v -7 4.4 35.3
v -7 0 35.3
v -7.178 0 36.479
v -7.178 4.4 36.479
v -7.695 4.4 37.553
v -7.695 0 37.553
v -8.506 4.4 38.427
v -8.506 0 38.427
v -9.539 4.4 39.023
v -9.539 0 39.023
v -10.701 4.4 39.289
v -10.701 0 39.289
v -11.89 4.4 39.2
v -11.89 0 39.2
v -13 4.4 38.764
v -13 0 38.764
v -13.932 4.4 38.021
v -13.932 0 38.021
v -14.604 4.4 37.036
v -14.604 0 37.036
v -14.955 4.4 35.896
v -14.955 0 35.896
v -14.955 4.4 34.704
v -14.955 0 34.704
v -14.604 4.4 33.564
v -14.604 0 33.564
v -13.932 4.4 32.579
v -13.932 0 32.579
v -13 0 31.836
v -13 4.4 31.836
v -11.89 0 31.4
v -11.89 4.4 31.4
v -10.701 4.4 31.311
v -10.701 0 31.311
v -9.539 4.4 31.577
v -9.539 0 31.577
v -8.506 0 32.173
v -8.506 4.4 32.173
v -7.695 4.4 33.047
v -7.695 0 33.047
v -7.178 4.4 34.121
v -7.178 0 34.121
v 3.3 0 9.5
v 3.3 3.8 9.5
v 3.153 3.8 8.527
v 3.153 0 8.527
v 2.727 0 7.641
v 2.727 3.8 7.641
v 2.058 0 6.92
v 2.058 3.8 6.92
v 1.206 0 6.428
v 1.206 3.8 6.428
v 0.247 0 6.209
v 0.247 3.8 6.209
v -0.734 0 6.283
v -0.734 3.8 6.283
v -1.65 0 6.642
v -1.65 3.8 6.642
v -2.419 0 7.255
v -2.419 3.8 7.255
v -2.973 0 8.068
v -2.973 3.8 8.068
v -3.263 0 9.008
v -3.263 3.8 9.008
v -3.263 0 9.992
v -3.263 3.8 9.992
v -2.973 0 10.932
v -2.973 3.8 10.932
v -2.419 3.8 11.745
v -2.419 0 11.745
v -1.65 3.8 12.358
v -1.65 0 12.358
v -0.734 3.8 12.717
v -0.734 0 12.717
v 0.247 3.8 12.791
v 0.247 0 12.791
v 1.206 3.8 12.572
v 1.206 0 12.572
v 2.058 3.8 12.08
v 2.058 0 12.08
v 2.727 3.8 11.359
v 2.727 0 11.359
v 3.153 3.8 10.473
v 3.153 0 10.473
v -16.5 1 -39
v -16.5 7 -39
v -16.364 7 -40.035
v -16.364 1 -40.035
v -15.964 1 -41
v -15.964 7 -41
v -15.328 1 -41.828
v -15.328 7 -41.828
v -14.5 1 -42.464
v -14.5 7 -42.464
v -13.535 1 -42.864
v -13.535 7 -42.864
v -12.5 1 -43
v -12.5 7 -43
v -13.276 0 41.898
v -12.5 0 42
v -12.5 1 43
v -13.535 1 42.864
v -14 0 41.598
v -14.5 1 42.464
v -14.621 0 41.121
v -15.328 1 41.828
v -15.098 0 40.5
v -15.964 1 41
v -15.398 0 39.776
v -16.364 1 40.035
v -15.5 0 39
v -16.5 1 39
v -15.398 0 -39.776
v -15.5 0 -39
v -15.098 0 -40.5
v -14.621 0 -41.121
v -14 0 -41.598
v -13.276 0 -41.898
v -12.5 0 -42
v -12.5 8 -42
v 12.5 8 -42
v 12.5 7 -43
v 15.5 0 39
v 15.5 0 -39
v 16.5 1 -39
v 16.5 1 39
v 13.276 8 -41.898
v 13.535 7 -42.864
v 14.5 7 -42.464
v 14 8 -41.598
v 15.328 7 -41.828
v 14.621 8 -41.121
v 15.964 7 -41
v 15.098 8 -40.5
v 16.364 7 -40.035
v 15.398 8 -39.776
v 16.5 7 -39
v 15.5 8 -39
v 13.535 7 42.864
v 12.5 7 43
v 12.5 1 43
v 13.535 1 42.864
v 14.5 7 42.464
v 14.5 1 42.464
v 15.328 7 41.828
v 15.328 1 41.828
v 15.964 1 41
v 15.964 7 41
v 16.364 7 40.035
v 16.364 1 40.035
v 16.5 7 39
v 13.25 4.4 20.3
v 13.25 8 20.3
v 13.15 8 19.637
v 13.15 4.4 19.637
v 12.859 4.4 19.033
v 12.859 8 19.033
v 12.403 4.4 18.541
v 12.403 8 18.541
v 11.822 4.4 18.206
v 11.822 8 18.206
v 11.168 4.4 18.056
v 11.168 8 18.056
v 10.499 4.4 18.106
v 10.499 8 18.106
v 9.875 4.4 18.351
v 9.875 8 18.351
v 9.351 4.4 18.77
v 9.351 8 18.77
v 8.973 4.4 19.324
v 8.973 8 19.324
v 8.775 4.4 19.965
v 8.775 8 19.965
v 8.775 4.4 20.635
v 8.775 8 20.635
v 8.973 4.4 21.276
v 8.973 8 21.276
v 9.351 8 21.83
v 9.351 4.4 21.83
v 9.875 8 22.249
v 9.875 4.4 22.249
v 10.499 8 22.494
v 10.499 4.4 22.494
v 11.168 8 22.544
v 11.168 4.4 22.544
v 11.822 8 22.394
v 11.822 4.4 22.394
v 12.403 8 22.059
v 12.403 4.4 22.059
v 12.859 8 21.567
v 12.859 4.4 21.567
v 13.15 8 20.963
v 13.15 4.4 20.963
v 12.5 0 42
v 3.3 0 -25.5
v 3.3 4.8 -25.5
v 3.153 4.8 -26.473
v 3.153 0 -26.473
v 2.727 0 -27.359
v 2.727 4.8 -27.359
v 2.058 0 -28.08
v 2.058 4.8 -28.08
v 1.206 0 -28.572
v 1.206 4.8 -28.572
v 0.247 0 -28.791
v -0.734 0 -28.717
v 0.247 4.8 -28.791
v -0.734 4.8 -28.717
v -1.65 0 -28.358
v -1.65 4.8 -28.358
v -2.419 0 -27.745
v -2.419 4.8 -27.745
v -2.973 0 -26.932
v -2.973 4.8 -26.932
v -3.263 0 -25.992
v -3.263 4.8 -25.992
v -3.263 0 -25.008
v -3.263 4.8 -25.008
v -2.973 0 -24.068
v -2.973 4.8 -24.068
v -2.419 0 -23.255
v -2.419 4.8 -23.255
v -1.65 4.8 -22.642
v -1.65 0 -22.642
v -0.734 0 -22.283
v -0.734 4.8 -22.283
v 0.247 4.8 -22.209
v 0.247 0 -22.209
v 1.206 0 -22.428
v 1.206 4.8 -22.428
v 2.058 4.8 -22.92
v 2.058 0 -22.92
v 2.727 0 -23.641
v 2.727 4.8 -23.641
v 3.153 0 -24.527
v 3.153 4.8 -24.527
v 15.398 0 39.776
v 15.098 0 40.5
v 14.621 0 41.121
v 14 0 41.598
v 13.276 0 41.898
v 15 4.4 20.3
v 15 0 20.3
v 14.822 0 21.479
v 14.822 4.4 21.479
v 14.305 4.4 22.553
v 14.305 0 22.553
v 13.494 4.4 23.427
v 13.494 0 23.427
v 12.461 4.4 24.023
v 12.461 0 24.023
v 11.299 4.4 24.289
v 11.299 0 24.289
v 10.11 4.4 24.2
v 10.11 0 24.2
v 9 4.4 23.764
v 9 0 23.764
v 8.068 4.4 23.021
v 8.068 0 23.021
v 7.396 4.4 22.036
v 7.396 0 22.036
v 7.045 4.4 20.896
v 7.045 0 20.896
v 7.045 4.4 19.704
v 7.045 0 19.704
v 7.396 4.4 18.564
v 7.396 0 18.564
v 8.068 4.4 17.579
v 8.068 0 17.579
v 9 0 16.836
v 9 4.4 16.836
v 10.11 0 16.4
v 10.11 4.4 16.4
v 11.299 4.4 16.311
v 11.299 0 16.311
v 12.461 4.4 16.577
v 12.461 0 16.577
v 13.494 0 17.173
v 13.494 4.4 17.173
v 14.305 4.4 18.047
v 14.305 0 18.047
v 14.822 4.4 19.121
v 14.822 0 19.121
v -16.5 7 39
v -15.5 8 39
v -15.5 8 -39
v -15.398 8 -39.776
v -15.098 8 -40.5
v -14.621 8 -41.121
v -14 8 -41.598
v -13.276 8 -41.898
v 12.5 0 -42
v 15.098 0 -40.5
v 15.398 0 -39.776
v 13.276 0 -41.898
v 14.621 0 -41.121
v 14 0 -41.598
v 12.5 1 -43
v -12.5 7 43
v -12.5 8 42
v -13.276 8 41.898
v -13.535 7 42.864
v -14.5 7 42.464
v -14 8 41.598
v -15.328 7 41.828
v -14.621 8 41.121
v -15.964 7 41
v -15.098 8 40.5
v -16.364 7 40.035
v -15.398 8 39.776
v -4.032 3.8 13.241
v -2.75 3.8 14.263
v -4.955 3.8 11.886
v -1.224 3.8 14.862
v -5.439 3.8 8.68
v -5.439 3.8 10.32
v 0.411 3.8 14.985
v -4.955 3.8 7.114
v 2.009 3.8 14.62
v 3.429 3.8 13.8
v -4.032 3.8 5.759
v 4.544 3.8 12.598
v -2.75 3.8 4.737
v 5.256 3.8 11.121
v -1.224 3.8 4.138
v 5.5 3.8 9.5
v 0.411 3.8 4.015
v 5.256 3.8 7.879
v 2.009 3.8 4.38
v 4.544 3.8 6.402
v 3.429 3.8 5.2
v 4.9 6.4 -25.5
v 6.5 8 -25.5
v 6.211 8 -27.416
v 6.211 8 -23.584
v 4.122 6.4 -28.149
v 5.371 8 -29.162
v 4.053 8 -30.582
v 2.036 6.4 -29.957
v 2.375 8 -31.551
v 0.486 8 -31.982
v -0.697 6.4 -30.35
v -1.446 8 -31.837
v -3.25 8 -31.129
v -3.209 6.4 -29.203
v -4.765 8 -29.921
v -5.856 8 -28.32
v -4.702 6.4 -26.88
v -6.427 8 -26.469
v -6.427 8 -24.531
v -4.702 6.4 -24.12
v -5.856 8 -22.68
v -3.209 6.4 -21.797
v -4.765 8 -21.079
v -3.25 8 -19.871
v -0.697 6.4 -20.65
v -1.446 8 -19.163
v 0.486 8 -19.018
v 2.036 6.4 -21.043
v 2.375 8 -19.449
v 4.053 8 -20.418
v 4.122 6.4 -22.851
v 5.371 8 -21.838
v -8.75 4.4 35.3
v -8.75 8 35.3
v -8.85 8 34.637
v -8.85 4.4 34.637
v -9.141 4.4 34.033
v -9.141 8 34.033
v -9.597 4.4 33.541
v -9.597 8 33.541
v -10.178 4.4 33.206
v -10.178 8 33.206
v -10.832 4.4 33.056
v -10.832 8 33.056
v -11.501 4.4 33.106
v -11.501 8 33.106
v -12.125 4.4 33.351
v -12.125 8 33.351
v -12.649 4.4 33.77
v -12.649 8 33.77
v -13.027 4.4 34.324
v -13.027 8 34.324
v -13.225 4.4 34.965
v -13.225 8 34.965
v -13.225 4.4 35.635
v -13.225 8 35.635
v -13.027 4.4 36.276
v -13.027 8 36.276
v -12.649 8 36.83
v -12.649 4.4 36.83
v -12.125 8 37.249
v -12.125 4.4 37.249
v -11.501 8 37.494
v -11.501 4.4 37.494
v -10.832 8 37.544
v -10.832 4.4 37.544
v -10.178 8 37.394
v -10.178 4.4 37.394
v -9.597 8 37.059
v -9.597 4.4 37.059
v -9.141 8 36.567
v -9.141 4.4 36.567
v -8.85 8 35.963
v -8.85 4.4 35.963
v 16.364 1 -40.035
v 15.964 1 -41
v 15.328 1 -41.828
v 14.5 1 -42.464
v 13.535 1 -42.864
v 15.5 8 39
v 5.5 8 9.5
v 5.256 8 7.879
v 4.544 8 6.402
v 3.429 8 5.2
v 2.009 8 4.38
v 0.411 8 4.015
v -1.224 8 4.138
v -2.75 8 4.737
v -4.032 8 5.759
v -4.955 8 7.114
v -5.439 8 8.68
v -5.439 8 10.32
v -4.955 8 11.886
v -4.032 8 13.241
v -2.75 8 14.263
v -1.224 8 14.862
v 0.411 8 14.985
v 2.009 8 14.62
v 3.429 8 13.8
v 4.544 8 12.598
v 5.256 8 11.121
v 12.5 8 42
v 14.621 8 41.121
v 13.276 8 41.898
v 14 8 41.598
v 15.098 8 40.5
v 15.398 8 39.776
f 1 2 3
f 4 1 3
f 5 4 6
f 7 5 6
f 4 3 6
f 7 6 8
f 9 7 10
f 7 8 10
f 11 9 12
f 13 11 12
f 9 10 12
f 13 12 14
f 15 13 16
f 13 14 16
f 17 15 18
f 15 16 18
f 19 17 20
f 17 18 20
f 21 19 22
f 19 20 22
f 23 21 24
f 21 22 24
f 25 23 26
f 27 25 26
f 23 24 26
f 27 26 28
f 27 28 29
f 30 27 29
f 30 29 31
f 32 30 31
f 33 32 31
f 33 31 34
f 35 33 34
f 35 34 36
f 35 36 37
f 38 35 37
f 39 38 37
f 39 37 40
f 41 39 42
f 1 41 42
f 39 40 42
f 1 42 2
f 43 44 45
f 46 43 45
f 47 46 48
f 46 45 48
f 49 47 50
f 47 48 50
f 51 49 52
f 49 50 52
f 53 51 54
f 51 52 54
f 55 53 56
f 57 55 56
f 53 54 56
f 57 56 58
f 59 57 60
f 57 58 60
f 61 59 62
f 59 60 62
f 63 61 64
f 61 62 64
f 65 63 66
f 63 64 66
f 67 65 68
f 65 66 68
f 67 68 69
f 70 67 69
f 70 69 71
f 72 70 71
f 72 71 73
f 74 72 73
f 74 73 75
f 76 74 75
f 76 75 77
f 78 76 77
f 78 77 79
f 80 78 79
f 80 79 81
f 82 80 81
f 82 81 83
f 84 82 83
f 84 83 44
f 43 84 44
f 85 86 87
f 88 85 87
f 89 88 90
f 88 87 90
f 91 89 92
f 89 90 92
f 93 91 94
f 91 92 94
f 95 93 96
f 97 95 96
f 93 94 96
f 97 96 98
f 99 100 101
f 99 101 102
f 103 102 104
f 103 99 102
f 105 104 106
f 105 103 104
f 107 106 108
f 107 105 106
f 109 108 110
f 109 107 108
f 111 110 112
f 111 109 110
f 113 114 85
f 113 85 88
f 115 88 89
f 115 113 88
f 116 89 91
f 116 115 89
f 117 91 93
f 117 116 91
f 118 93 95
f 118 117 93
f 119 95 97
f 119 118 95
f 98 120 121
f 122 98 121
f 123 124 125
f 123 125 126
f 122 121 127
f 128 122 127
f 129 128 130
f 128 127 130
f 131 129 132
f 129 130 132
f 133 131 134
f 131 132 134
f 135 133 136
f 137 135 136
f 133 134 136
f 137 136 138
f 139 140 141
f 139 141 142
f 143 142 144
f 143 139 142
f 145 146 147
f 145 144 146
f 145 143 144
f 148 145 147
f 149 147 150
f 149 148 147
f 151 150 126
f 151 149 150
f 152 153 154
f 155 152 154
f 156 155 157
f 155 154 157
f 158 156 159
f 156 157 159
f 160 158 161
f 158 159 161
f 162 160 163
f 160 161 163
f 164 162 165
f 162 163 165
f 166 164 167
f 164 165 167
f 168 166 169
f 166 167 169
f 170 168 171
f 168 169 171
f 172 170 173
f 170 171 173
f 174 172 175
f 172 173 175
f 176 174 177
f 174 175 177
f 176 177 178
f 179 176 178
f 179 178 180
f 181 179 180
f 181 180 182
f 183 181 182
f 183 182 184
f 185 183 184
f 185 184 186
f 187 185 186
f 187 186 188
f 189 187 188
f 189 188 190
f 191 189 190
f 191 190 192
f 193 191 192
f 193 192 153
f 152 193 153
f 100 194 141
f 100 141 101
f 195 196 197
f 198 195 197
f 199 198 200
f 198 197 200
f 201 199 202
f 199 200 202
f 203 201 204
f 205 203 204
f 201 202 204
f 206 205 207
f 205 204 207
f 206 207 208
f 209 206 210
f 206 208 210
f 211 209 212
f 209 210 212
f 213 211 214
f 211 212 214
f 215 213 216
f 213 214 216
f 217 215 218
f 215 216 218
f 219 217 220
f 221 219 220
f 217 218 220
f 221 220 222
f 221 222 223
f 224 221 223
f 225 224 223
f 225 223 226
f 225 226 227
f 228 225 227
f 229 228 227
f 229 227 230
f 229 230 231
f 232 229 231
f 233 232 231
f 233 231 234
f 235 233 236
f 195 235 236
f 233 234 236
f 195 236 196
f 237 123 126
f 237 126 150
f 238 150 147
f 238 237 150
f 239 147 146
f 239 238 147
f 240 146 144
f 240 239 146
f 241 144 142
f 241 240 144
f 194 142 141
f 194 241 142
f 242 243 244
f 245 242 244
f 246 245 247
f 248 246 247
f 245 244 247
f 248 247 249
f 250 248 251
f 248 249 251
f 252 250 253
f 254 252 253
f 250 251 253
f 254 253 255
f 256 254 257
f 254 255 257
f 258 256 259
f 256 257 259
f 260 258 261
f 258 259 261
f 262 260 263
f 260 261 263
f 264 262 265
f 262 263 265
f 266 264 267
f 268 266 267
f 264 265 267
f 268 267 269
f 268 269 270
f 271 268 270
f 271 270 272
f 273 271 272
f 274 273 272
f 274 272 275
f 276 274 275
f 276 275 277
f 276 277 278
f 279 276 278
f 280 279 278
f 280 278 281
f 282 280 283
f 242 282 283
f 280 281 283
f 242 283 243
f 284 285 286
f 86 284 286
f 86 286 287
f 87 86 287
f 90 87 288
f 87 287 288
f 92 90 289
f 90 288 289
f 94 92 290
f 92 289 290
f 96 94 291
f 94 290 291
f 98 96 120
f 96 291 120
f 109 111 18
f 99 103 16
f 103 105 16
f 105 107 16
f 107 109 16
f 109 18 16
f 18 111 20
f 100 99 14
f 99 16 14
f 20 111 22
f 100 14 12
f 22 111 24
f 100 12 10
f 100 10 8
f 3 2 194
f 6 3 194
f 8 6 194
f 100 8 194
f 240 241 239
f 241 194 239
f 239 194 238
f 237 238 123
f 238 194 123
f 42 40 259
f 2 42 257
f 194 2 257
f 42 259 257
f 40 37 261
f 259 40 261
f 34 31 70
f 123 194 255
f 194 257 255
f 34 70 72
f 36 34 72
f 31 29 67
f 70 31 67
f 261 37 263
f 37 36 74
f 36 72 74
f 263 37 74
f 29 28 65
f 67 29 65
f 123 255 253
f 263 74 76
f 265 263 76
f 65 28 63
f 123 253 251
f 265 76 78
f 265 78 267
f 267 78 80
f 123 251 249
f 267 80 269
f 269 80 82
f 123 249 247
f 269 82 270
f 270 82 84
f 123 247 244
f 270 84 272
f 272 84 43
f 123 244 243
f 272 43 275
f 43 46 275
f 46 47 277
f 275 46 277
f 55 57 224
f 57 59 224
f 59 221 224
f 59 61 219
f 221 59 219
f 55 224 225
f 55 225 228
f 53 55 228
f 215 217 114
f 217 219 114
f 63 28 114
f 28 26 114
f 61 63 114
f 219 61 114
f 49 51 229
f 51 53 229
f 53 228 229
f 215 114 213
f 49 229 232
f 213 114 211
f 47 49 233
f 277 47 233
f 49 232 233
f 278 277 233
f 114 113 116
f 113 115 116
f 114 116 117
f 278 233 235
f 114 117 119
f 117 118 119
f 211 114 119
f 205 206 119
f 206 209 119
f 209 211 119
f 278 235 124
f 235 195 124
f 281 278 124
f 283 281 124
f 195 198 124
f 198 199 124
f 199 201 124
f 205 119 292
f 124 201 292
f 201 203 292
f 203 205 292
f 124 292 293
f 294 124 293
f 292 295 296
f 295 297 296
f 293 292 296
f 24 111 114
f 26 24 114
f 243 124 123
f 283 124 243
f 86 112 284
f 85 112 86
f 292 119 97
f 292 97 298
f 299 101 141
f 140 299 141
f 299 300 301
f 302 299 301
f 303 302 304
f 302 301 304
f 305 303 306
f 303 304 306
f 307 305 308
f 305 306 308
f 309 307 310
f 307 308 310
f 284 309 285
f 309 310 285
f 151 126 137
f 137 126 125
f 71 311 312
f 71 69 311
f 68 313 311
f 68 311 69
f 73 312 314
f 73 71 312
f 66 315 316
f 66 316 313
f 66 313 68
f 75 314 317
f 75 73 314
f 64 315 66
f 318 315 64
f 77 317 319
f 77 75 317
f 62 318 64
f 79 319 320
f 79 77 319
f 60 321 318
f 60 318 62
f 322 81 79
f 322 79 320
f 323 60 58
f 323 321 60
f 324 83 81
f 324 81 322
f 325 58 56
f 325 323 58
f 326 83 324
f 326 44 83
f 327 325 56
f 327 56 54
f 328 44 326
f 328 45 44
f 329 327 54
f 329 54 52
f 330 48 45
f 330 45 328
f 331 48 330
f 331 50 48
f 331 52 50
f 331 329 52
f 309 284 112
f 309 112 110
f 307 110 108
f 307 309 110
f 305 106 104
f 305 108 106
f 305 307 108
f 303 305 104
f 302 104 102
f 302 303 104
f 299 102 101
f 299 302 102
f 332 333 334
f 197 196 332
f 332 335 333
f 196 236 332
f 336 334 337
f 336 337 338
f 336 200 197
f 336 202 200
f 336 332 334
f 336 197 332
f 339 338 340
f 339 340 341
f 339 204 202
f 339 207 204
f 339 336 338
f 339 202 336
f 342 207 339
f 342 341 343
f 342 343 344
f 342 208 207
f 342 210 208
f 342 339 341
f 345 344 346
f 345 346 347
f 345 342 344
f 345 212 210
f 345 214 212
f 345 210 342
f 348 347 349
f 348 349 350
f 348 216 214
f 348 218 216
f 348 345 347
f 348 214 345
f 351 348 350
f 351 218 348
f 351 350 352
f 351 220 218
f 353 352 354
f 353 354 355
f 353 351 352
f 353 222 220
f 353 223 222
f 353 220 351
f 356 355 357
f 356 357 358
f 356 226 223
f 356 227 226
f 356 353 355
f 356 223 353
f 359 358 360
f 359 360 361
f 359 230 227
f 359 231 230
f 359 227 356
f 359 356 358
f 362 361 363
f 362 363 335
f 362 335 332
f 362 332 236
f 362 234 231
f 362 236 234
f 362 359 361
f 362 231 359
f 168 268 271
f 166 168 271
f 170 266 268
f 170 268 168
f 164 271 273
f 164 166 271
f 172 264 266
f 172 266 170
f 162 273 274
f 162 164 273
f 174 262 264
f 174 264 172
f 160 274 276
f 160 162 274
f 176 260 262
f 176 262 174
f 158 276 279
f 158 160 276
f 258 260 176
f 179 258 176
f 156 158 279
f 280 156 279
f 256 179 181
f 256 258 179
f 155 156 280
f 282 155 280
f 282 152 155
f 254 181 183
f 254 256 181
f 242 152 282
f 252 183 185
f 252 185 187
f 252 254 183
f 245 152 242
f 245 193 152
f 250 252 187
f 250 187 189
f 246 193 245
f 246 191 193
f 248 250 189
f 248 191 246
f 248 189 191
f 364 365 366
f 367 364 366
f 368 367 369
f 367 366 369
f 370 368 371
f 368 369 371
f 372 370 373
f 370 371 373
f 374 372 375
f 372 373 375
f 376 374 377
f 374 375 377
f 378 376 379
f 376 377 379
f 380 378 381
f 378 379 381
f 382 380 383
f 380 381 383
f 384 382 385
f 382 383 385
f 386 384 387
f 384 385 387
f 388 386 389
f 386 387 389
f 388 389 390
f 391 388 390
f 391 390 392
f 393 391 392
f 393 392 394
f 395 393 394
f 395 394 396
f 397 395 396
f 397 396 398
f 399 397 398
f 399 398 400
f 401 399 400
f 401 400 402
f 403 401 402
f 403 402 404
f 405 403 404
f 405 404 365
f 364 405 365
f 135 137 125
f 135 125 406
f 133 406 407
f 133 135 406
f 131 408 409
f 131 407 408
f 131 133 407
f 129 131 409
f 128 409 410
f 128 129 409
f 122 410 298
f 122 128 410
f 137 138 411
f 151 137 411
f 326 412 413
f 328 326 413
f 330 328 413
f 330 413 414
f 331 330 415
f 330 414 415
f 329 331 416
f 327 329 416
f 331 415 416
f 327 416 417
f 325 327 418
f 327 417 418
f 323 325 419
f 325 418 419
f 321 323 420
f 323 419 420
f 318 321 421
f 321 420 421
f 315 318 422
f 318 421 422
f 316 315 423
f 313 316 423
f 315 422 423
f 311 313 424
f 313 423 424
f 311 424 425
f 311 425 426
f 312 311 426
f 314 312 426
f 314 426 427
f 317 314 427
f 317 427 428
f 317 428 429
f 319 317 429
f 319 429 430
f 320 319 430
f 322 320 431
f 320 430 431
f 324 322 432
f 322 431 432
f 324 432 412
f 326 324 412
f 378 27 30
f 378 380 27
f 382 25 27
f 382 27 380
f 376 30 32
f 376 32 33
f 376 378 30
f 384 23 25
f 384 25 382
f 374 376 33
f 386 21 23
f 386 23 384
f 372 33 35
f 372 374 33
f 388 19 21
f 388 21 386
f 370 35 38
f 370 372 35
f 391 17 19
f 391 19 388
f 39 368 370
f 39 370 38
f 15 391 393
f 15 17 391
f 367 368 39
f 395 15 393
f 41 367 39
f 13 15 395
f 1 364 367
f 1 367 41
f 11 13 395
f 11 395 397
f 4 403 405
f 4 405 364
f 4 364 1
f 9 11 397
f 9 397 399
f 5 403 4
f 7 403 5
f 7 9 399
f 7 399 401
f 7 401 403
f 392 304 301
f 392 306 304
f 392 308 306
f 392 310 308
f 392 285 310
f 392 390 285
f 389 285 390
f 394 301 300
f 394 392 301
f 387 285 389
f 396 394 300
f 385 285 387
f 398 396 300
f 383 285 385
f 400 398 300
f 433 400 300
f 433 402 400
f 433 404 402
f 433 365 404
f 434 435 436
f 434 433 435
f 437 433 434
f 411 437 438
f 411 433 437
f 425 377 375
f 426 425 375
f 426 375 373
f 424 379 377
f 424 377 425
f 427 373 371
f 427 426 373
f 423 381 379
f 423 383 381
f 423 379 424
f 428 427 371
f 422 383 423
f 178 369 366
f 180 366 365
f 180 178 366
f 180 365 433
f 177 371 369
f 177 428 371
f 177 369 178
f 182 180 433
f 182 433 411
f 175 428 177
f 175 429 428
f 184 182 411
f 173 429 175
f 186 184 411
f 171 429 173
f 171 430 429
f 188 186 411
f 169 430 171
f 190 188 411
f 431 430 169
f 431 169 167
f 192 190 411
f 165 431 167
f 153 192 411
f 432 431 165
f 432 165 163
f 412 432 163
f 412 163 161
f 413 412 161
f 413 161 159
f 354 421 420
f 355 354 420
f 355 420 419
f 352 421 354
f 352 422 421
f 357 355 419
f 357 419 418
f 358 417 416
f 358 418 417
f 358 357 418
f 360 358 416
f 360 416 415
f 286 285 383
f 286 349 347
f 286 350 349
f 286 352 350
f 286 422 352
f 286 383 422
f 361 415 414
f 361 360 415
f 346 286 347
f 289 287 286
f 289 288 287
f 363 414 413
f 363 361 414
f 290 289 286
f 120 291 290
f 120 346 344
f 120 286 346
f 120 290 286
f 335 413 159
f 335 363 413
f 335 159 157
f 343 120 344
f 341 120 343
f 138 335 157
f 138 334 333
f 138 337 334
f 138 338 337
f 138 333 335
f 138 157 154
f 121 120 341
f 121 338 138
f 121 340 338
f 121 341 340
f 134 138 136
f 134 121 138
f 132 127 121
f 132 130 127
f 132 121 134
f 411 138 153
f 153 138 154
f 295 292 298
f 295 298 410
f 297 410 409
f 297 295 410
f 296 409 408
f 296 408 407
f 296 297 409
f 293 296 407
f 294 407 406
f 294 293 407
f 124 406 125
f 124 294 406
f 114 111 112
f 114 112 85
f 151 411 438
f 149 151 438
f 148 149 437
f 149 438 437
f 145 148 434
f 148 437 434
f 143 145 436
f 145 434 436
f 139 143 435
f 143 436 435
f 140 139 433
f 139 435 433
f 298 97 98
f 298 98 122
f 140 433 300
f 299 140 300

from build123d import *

# Parameters (mm, degrees)
SKETCH1_W           = 33
SKETCH1_H           = 86
BOSS_EXTRUDE1_DEPTH = 8
FILLET1_R           = 4
CHAMFER1_SIZE       = 1
SKETCH2_R           = 3.3
SKETCH2_R_2         = 2.25
CUT_EXTRUDE1_DEPTH  = 8
SKETCH3_R           = 5.5
CUT_EXTRUDE2_DEPTH  = 4.2
CHAMFER3_SIZE       = 3.2
SKETCH4_R           = 4
CUT_EXTRUDE3_DEPTH  = 4.4


with BuildPart() as part:
    # Sketch1 → Boss-Extrude1 (new body)
    with BuildSketch(Plane(origin=(0, 0, 0), x_dir=(1, 0, 0), z_dir=(0, 1, 0))):
        Rectangle(SKETCH1_W, SKETCH1_H)
    extrude(amount=BOSS_EXTRUDE1_DEPTH)

    # Fillet1
    fillet1_edges = [part.edges().sort_by_distance(p)[0] for p in [
        (16.5, 4, 43),
        (-16.5, 4, 43),
        (-16.5, 4, -43),
        (16.5, 4, -43),
    ]]
    fillet(fillet1_edges, radius=FILLET1_R)

    # Chamfer1
    chamfer1_edges = [part.edges().sort_by_distance(p)[0] for p in [
        (-16.5, 0, 0),
        (-16.5, 8, 0),
        (16.5, 0, 0),
        (0, 0, 43),
        (0, 0, -43),
        (15.328427125, 0, 41.828427125),
        (-15.328427125, 0, 41.828427125),
        (15.328427125, 0, -41.828427125),
        (-15.328427125, 0, -41.828427125),
        (0, 8, -43),
        (16.5, 8, 0),
        (0, 8, 43),
        (15.328427125, 8, 41.828427125),
        (-15.328427125, 8, 41.828427125),
        (15.328427125, 8, -41.828427125),
        (-15.328427125, 8, -41.828427125),
    ]]
    chamfer(chamfer1_edges, length=CHAMFER1_SIZE)

    # Sketch2 → Cut-Extrude1 (cut)
    with BuildSketch(Plane(origin=(0, 8, 0), x_dir=(1, 0, 0), z_dir=(0, 1, 0))):
        with Locations((0, 25.5)):
            Circle(SKETCH2_R)
        with Locations((0, -9.5)):
            Circle(SKETCH2_R)
        with Locations((11, -20.3)):
            Circle(SKETCH2_R_2)
        with Locations((-11, -35.3)):
            Circle(SKETCH2_R_2)
    extrude(amount=-CUT_EXTRUDE1_DEPTH, mode=Mode.SUBTRACT)

    # Sketch3 → Cut-Extrude2 (cut)
    with BuildSketch(Plane(origin=(0, 8, 0), x_dir=(1, 0, 0), z_dir=(0, 1, 0))):
        with Locations((0, -9.5)):
            Circle(SKETCH3_R)
    extrude(amount=-CUT_EXTRUDE2_DEPTH, mode=Mode.SUBTRACT)

    # Chamfer3
    chamfer3_edges = [part.edges().sort_by_distance(p)[0] for p in [
        (-3.3, 8, -25.5),
    ]]
    chamfer(chamfer3_edges, length=CHAMFER3_SIZE)

    # Sketch4 → Cut-Extrude3 (cut)
    with BuildSketch(Plane.XZ):
        with Locations((11, 20.3)):
            Circle(SKETCH4_R)
        with Locations((-11, 35.3)):
            Circle(SKETCH4_R)
    extrude(amount=-CUT_EXTRUDE3_DEPTH, mode=Mode.SUBTRACT)


solid = part.part
